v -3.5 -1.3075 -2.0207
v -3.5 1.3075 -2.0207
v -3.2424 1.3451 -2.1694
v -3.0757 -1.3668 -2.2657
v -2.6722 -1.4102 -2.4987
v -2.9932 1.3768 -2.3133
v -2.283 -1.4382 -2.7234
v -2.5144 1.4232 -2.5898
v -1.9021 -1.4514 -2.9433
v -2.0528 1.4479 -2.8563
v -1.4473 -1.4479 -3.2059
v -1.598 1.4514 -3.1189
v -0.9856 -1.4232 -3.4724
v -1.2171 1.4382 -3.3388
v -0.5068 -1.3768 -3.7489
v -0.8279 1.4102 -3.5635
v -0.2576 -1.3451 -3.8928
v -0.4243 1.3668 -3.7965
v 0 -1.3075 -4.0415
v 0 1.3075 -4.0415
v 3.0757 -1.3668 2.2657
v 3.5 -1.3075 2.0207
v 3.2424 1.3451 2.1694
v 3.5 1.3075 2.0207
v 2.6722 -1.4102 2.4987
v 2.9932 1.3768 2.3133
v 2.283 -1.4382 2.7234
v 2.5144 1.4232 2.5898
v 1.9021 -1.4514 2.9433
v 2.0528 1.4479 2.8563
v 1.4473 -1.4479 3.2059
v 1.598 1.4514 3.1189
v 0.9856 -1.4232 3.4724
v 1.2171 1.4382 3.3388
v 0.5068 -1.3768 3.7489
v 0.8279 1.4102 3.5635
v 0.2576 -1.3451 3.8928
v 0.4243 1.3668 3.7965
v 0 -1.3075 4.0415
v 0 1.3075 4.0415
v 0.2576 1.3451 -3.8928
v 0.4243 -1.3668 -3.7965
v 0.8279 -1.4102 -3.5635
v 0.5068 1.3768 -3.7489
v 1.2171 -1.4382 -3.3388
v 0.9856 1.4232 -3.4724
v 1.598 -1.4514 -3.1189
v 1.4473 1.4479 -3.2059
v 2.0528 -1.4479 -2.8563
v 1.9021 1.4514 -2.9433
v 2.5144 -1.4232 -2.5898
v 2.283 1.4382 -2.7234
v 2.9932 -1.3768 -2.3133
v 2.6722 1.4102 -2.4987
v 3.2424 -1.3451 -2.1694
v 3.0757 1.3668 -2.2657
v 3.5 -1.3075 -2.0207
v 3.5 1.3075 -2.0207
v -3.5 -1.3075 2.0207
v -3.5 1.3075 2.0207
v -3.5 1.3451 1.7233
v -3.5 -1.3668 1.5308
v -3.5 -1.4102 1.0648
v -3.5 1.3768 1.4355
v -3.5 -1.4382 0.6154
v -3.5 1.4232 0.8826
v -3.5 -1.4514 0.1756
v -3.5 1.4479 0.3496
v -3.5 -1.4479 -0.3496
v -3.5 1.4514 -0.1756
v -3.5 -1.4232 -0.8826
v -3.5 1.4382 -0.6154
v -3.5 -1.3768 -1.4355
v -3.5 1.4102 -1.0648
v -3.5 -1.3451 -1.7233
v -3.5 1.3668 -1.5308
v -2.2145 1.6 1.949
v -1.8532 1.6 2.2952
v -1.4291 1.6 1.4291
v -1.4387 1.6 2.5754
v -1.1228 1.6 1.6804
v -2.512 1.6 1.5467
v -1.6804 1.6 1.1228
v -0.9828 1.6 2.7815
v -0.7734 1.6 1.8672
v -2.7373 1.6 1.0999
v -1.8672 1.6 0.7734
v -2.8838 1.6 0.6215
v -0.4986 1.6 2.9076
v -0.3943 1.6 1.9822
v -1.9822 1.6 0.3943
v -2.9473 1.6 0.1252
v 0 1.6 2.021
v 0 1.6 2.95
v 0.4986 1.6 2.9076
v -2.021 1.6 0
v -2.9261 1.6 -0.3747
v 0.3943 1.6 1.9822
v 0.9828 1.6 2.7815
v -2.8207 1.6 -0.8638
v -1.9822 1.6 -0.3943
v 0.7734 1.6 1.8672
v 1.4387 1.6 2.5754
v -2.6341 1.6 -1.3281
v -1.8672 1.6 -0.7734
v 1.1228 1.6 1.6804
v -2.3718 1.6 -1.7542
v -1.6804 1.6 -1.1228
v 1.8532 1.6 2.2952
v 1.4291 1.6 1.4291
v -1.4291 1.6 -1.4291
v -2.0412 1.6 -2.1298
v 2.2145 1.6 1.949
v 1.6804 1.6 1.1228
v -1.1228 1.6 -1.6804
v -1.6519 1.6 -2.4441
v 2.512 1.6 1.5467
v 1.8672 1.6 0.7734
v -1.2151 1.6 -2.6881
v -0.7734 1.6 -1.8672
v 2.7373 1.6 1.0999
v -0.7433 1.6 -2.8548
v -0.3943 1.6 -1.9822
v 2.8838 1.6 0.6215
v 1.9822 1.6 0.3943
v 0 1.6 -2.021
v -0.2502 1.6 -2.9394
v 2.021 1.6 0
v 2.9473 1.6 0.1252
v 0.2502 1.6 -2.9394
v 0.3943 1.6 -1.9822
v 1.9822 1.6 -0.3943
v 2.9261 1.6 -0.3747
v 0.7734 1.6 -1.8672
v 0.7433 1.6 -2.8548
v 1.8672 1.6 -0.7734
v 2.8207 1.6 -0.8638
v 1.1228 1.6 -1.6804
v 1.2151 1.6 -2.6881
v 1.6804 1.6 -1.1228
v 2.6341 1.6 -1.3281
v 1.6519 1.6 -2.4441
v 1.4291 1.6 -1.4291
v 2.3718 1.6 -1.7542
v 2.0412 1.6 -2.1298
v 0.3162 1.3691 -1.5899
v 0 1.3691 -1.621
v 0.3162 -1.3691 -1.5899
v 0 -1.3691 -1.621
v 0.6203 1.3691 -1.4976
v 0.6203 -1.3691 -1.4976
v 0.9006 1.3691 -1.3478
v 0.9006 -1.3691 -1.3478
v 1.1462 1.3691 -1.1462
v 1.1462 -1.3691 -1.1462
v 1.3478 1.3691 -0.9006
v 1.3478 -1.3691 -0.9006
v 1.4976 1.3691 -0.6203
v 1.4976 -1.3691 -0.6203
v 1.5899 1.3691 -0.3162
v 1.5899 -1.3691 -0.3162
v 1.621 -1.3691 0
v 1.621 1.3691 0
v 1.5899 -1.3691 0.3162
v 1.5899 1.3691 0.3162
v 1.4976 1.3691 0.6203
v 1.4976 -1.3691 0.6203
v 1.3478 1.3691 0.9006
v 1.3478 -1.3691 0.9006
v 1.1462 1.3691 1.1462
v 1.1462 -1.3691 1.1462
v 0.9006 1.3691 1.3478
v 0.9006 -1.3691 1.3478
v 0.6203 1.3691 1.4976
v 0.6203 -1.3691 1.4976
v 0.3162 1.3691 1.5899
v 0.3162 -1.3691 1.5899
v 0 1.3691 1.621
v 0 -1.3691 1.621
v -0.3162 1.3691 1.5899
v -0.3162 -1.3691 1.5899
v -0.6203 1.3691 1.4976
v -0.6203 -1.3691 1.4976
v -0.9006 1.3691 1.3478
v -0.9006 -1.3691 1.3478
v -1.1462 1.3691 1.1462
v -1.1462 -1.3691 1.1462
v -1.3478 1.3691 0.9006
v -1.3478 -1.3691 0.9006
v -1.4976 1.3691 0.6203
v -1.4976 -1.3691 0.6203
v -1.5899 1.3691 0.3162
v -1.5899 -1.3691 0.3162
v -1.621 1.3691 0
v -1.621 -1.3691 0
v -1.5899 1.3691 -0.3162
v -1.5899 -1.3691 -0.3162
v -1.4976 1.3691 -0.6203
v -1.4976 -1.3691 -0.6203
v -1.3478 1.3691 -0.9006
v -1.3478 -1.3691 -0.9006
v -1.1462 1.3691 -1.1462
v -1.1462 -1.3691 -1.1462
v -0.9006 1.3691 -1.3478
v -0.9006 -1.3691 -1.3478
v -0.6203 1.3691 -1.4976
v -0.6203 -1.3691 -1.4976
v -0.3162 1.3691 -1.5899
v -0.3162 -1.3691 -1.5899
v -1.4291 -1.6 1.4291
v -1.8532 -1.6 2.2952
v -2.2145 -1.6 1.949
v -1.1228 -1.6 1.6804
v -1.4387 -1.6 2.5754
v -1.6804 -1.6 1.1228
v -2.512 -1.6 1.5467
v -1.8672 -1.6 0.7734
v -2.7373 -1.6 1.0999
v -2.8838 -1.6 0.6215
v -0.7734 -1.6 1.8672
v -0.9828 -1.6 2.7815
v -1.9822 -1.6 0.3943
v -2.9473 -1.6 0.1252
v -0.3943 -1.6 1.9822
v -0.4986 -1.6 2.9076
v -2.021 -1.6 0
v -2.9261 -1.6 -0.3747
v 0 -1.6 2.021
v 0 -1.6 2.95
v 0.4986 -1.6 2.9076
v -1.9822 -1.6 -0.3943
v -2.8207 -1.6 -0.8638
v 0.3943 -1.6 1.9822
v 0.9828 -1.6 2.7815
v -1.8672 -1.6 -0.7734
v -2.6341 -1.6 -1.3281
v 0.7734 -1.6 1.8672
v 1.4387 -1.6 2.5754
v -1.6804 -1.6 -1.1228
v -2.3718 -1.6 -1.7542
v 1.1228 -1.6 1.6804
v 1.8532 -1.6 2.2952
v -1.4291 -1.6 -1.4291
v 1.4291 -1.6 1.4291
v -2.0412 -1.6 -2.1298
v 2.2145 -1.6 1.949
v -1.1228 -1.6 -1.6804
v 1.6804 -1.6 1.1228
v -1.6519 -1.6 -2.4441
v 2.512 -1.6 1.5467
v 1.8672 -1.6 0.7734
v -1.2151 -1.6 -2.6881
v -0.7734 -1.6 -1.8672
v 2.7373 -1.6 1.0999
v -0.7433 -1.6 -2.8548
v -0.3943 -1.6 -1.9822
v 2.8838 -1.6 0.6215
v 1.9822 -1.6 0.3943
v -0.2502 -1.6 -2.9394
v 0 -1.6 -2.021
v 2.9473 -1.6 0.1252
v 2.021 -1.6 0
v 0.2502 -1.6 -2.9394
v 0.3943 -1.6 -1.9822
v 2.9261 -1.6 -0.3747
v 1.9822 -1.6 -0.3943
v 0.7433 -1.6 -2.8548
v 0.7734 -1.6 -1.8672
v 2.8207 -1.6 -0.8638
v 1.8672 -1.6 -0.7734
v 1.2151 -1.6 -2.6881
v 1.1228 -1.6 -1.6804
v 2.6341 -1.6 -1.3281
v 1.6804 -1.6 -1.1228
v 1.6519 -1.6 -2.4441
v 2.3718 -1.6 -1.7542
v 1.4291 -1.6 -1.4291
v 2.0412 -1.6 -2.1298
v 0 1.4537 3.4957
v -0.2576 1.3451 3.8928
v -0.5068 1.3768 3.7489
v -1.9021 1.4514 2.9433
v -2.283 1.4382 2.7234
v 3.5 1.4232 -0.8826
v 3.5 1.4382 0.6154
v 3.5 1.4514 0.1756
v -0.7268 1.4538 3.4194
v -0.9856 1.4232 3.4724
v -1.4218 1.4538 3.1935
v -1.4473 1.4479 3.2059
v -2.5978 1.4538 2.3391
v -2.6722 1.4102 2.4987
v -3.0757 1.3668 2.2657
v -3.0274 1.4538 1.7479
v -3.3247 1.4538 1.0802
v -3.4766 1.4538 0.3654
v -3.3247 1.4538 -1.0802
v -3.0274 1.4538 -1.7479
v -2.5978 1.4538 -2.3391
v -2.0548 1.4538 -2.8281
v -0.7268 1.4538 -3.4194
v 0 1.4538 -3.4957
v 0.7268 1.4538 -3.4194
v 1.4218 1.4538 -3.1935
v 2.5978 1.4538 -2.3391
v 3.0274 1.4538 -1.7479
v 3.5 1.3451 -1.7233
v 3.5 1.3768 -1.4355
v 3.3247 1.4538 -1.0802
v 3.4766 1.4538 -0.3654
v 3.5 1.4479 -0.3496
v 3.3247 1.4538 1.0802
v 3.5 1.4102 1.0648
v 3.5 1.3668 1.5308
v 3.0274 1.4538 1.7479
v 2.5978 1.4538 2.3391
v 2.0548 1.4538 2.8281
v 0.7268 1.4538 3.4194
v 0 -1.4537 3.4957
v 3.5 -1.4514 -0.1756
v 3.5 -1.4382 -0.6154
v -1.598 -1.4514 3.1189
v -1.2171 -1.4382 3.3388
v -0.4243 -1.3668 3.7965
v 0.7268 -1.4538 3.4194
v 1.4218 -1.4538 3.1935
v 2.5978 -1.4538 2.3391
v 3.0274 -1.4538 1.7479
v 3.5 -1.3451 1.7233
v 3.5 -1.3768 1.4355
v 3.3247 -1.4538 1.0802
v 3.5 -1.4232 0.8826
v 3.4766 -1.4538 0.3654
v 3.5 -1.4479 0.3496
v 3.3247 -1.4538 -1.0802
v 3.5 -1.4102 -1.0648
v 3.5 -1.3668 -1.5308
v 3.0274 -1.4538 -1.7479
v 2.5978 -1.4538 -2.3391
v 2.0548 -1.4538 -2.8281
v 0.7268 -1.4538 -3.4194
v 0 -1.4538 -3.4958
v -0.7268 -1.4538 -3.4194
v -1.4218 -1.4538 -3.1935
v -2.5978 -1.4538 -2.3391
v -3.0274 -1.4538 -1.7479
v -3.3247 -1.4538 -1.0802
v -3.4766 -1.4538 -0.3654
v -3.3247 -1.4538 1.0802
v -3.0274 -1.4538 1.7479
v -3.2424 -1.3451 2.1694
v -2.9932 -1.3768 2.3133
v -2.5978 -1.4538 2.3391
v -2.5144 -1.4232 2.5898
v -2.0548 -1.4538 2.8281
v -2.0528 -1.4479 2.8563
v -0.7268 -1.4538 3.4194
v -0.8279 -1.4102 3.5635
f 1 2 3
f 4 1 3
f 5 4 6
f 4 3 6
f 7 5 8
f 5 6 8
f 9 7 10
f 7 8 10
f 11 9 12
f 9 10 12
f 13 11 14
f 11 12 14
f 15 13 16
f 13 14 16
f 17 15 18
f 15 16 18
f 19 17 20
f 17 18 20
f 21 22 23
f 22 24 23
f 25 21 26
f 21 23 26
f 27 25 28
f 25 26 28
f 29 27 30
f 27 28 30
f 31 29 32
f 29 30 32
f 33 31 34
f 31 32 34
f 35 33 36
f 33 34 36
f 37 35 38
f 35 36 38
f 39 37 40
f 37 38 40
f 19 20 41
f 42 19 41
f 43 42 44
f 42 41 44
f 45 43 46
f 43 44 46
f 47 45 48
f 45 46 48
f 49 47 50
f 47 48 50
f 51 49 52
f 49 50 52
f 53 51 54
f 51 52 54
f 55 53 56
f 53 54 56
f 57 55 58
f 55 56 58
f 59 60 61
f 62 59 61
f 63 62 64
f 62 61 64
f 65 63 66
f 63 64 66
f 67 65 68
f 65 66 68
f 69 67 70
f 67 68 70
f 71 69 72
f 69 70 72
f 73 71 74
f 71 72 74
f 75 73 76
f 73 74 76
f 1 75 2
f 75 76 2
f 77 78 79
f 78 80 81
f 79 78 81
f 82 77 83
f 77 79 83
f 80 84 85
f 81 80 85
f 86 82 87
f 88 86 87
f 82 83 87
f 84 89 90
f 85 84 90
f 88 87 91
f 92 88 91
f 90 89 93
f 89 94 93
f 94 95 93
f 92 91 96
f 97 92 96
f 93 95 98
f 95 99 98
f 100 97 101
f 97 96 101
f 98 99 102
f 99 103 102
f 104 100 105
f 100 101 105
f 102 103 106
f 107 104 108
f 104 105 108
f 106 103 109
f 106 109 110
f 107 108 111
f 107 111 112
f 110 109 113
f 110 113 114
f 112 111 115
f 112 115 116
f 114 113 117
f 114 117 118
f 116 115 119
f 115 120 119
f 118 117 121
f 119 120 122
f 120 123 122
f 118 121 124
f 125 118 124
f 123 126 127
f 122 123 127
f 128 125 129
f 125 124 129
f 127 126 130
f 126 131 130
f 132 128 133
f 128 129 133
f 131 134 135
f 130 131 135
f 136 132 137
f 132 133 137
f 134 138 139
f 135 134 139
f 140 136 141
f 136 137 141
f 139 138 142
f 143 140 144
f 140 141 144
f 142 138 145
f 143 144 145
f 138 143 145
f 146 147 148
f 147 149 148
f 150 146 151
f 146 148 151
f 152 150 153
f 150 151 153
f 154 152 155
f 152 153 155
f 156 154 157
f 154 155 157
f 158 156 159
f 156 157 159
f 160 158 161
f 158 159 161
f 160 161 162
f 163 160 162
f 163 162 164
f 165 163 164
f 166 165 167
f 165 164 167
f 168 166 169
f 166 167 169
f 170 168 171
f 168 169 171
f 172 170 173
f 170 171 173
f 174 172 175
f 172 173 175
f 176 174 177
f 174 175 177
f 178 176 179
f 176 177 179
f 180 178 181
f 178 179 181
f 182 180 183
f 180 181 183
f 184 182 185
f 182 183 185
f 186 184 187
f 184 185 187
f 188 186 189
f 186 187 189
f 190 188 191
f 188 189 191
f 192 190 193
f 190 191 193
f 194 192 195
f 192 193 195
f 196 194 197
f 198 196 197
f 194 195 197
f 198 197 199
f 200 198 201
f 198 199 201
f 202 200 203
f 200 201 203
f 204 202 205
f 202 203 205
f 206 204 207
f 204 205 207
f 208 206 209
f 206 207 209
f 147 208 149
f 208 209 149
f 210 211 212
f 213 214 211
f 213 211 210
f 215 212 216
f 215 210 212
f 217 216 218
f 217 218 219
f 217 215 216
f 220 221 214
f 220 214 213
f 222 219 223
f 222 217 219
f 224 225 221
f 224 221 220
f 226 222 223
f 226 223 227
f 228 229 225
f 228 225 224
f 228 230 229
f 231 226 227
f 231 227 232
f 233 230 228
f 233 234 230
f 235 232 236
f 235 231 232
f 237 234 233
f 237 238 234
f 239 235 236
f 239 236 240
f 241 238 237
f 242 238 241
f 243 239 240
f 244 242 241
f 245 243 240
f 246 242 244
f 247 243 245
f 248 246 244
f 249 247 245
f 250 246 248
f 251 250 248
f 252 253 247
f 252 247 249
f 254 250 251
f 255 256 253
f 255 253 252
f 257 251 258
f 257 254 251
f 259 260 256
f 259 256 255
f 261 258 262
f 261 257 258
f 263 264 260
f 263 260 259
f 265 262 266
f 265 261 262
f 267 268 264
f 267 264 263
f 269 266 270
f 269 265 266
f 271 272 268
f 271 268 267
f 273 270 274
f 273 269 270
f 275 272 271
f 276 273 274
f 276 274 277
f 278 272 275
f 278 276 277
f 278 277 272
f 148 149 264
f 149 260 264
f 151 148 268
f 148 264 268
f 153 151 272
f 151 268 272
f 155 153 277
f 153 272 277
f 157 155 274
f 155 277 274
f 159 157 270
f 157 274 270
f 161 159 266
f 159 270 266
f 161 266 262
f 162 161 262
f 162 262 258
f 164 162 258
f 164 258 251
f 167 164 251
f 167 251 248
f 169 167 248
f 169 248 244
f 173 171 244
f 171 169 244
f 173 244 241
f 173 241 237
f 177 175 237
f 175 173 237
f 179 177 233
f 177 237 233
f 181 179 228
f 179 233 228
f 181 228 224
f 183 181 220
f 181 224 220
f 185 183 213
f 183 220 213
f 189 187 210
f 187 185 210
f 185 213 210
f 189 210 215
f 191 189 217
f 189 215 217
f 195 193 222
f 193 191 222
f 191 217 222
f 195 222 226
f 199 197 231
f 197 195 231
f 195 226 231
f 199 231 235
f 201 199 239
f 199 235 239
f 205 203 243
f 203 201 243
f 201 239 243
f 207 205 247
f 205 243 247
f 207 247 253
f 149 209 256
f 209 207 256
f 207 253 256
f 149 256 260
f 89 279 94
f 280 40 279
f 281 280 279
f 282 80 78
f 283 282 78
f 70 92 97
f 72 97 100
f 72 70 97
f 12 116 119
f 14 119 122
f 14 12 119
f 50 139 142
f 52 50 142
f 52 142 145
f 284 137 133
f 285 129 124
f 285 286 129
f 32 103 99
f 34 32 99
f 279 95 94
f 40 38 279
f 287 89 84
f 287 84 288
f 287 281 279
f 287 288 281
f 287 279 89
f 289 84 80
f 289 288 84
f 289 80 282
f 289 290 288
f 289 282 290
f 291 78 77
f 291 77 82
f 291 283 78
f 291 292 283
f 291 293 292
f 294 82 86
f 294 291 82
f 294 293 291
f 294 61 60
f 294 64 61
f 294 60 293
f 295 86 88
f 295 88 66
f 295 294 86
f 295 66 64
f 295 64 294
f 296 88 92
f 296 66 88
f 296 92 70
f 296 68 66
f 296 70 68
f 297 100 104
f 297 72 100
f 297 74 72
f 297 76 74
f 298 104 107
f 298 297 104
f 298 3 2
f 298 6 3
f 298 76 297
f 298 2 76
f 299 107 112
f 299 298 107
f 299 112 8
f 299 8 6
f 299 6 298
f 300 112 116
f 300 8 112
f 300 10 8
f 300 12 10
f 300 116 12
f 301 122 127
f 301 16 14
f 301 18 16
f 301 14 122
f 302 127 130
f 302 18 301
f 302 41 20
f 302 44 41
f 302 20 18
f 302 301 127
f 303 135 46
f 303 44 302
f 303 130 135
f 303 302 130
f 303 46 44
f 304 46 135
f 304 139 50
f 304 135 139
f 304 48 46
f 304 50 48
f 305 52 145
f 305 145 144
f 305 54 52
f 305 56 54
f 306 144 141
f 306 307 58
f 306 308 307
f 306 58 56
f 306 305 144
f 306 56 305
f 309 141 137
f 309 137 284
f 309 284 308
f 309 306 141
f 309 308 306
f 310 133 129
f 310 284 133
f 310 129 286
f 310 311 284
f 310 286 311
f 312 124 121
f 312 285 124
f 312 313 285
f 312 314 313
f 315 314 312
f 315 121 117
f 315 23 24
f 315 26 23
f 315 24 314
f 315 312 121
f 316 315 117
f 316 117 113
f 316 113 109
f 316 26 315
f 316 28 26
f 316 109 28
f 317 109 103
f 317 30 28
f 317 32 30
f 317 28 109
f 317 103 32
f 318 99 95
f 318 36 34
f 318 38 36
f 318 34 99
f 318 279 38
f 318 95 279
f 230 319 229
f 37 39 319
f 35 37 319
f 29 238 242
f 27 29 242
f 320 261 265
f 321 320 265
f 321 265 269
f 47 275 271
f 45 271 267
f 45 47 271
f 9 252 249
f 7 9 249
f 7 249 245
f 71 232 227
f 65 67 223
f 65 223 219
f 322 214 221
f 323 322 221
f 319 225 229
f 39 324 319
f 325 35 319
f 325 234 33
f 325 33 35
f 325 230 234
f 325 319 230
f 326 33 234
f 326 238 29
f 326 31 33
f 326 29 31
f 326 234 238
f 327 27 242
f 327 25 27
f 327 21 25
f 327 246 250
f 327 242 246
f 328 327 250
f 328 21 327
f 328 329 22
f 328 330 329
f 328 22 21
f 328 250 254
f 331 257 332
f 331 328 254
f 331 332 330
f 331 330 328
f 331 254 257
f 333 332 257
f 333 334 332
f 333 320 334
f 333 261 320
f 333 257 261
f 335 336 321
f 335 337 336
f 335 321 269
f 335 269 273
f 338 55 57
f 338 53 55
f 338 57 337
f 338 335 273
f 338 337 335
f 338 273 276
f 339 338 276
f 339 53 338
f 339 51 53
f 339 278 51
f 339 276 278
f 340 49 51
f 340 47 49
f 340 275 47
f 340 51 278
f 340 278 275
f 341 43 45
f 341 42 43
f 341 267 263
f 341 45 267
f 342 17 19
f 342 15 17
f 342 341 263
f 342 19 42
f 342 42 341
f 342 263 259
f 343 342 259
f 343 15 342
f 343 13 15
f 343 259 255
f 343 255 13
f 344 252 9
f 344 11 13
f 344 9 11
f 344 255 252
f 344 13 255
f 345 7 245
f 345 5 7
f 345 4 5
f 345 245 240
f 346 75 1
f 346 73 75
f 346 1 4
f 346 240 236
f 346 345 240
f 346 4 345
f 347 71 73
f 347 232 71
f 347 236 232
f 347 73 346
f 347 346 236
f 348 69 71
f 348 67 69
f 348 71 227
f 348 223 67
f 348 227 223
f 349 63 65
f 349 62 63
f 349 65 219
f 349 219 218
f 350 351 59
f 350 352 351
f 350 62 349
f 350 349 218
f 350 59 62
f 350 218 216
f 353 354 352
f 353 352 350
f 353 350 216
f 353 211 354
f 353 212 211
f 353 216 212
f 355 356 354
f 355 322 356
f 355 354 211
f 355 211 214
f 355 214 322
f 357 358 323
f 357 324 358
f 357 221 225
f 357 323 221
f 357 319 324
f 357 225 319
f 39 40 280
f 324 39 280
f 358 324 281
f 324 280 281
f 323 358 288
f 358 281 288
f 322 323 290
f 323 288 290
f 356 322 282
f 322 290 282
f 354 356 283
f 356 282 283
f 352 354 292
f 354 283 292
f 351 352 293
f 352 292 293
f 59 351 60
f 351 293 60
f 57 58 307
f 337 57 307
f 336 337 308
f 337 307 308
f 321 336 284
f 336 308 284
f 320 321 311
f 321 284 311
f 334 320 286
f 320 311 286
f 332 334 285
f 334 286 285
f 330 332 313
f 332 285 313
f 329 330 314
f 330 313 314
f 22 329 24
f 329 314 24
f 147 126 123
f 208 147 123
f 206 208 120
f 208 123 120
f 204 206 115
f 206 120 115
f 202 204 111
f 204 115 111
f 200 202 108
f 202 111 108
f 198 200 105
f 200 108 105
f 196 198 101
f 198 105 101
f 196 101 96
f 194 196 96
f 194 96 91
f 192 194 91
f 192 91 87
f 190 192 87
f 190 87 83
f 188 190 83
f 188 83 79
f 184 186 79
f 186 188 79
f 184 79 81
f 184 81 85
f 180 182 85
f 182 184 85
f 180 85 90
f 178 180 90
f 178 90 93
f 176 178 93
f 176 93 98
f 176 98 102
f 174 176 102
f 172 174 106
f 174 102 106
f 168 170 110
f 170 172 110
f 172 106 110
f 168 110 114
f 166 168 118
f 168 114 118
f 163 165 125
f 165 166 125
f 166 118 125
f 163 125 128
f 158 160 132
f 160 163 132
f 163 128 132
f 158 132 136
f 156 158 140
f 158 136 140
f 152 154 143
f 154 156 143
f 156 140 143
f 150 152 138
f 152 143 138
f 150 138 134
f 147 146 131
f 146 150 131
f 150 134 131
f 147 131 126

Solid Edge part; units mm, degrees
sketch "Sketch1" plane through (0, 0, 0) normal (0, -1, 0) x (1, 0, 0)
  line L0 (3.5, 2.0207) -> (0, 4.0415)
  line L1 (0, 4.0415) -> (-3.5, 2.0207)
  line L2 (-3.5, 2.0207) -> (-3.5, -2.0207)
  line L3 (-3.5, -2.0207) -> (0, -4.0415)
  line L4 (0, -4.0415) -> (3.5, -2.0207)
  line L5 (3.5, -2.0207) -> (3.5, 2.0207)
extrude "Protrusion1" add sketch "Sketch1" along normal mid plane 3.2
sketch "Sketch2" plane through (0, 0, 0) normal (1, 0, 0) x (0, 1, 0)
  line L0 (-1.6, 2.95) -> (-1.3075, 4.0415)
revolve "RevolvedCutout1" cut sketch "Sketch2" angle 360 about axis through (0, 0, 0) along (0, -1, 0) material side at (0, -1.502, 3.5087)
mirror "Mirror1" about plane through (0, 0, 0) normal (0, -1, 0) of "RevolvedCutout1"
hole "孔_7" at (0, -1.6, 0) direction (0, 1, 0) diameter 3.242 end up to next start chamfer 0.4 start chamfer angle 60 end chamfer 0.4 end chamfer angle 60
